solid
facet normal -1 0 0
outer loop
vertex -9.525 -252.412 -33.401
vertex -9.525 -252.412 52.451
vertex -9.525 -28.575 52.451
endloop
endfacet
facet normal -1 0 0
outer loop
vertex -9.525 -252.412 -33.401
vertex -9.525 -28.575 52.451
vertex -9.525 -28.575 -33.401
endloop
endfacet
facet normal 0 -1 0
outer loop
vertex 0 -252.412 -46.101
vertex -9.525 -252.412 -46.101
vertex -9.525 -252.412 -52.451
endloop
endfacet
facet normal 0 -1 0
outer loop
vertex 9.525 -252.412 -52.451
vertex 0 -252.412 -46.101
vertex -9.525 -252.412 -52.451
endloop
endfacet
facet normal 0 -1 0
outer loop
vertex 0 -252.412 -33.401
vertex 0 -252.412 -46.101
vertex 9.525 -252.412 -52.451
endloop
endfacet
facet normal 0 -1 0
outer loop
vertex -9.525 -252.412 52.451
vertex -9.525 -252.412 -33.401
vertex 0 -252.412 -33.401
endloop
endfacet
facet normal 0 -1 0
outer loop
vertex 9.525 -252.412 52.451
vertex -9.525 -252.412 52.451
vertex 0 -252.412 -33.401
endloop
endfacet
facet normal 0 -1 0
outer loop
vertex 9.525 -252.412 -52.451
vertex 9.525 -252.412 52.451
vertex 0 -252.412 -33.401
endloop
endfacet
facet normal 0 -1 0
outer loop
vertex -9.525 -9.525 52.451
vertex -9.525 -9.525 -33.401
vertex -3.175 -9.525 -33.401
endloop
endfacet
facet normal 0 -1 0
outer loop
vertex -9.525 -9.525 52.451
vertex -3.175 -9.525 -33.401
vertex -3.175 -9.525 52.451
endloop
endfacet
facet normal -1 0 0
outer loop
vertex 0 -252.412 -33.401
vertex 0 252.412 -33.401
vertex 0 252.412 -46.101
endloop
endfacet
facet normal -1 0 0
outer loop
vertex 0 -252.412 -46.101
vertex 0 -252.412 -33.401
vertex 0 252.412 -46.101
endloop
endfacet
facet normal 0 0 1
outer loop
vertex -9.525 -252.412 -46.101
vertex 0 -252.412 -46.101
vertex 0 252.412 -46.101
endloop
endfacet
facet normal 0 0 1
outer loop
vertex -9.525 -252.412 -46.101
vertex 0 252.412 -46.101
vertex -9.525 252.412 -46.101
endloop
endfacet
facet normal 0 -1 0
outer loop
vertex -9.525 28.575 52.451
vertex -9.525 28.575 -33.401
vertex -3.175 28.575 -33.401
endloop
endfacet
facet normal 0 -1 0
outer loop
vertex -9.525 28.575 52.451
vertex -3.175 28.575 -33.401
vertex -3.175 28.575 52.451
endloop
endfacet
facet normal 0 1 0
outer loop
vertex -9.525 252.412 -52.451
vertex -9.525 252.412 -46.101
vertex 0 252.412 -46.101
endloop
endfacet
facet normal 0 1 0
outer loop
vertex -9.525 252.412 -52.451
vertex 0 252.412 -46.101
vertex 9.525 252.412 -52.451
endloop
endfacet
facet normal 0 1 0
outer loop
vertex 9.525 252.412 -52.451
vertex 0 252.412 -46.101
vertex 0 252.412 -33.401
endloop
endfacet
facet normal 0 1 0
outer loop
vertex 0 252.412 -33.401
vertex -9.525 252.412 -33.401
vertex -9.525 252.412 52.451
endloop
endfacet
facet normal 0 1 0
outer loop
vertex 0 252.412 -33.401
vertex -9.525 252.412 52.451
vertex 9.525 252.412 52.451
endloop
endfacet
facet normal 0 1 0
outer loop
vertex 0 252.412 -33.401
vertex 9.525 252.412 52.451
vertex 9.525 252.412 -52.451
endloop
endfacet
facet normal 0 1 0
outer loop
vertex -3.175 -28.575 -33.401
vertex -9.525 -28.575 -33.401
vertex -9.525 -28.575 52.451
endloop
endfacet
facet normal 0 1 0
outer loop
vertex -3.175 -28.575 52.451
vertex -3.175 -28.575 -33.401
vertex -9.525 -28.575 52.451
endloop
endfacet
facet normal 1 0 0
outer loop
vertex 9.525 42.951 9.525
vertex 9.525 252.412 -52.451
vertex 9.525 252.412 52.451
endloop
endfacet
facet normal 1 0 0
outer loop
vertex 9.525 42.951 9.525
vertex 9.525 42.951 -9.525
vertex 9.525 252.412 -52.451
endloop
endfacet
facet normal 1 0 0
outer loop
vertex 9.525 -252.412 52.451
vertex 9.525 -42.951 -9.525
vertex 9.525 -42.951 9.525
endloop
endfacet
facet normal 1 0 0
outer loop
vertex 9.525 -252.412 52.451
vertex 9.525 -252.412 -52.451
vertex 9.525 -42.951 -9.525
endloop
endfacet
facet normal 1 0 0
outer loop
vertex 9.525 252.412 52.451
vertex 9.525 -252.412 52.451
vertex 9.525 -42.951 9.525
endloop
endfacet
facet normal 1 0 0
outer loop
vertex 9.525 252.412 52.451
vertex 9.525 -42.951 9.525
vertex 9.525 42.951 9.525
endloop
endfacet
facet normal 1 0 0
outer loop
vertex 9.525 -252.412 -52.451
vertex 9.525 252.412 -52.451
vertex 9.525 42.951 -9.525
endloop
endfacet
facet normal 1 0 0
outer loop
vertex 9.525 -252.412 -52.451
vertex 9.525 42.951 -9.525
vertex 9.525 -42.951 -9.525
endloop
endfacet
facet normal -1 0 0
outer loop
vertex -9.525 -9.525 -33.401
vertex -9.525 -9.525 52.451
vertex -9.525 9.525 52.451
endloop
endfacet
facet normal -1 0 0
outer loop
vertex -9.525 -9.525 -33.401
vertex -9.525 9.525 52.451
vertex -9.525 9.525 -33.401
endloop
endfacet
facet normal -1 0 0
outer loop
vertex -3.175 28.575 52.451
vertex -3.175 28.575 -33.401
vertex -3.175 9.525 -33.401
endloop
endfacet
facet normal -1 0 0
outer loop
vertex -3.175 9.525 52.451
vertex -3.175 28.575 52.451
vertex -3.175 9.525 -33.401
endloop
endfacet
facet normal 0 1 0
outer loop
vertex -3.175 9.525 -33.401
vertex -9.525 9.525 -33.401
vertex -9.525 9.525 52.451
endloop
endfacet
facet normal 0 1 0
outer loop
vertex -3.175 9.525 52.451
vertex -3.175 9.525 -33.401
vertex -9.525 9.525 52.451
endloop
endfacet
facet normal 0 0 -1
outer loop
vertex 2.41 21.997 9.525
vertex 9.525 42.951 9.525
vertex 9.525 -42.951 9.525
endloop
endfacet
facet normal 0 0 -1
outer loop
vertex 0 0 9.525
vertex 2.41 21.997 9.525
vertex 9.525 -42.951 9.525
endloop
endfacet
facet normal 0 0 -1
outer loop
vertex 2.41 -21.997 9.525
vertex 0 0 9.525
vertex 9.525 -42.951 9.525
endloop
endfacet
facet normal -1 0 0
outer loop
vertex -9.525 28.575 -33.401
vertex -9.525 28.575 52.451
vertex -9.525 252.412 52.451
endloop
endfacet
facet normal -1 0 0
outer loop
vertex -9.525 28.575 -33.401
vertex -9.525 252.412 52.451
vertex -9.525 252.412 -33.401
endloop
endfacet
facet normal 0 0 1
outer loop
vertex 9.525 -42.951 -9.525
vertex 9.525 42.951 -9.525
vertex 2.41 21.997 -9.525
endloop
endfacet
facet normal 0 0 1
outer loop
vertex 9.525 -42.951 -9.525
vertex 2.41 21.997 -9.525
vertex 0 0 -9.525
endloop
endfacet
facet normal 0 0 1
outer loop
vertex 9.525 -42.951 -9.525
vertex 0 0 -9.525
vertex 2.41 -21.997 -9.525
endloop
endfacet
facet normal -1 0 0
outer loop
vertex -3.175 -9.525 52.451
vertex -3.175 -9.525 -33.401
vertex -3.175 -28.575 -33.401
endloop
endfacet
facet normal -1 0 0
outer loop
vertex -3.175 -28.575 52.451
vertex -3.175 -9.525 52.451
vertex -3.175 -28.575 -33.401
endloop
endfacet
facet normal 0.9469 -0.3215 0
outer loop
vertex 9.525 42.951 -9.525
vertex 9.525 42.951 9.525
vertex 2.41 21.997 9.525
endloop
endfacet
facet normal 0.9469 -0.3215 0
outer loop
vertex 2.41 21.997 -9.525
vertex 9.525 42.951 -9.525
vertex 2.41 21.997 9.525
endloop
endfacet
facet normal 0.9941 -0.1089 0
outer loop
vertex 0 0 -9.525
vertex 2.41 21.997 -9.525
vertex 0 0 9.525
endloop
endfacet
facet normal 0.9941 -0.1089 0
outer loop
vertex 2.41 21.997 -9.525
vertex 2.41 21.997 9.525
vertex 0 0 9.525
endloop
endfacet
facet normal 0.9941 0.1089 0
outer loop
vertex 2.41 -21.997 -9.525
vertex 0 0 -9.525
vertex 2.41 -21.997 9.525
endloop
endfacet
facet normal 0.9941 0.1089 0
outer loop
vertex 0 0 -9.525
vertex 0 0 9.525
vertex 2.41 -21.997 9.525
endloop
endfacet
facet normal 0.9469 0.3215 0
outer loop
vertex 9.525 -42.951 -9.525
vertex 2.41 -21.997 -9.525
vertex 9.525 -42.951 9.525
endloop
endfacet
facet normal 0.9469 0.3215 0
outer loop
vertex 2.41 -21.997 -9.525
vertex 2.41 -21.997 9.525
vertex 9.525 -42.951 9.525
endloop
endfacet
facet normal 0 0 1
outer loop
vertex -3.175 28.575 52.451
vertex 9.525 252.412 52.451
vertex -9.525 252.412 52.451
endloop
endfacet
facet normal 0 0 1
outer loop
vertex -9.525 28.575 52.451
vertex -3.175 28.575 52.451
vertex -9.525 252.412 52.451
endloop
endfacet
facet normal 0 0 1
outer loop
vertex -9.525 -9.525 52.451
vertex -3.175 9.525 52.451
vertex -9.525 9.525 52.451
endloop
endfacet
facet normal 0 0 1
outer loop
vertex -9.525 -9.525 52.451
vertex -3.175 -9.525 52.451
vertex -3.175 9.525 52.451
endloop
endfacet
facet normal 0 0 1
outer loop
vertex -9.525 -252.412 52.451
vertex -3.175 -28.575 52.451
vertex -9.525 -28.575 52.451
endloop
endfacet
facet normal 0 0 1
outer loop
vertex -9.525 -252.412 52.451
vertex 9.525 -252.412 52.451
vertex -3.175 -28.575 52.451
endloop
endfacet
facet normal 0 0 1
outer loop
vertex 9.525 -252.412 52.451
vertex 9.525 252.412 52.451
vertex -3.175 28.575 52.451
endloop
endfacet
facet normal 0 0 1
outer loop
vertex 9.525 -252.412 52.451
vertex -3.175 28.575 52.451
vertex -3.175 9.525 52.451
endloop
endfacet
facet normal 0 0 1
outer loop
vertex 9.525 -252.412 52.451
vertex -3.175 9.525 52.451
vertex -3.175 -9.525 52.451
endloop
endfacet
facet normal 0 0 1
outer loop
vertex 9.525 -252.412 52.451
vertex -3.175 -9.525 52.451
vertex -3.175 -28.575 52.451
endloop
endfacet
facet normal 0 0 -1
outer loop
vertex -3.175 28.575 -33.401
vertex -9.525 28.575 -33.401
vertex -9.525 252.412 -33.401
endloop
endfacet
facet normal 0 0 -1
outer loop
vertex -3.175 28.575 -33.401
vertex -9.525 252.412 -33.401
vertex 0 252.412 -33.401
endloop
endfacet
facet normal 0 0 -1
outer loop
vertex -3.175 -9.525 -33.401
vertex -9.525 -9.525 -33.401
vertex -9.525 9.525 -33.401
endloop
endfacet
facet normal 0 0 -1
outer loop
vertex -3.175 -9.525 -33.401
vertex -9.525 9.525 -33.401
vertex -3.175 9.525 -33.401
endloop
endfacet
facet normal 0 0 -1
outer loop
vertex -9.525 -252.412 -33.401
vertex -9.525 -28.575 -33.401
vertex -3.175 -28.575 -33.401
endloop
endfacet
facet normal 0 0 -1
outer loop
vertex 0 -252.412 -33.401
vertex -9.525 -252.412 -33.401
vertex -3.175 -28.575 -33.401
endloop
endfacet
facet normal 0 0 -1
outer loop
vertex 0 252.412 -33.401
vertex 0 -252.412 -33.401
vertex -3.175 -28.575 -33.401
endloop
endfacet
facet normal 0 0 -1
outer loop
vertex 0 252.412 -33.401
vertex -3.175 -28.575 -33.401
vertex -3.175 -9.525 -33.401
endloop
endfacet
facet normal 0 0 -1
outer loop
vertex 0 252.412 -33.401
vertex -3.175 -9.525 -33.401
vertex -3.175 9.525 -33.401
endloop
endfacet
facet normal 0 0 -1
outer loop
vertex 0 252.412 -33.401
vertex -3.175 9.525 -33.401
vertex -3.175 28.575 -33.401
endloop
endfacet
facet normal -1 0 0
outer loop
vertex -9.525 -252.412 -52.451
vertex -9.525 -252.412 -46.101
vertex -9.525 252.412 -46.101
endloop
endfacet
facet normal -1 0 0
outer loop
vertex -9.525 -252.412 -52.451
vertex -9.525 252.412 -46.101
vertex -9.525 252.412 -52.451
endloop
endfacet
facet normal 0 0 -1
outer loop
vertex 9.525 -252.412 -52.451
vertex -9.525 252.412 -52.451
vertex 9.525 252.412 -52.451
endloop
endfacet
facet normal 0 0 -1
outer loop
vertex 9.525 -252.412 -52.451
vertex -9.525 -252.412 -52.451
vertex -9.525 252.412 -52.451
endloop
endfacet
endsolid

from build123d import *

# Parameters (mm, degrees)
F1_DEPTH = 252.4125
F4_R     = 101.6
F5_DEPTH = 9.525
F6_W     = 19.05
F6_H     = 85.852
F7_DEPTH = 6.35


with BuildPart() as f1:
    # F0 (on Front) → F1 (new body)
    with BuildSketch(Plane.XZ):
        Polygon((9.525, 52.451), (-9.525, 52.451), (-9.525, -33.401), (0, -33.401), (0, -46.101), (-9.525, -46.101), (-9.525, -52.451), (9.525, -52.451), align=None)
    extrude(amount=F1_DEPTH)

    # F3: F1 across plane


with BuildPart() as f1_1:
    add(f1.part)
    add(f1.part.mirror(Plane.XZ))

    # F4 (on Top) → F5 (cut, symmetric)
    with BuildSketch(Plane.XY):
        with Locations((101.6, 0)):
            Circle(F4_R)
    extrude(amount=F5_DEPTH, both=True, mode=Mode.SUBTRACT)

    # F6 (on face) → F7 (cut)
    with BuildSketch(Plane(origin=(-9.525, 0, 0), x_dir=(0, -1, 0), z_dir=(-1, 0, 0))):
        with Locations((-19.05, 9.525)):
            Rectangle(F6_W, F6_H)
        with Locations((19.05, 9.525)):
            Rectangle(F6_W, F6_H)
    extrude(amount=-F7_DEPTH, mode=Mode.SUBTRACT)


solid = f1_1.part
